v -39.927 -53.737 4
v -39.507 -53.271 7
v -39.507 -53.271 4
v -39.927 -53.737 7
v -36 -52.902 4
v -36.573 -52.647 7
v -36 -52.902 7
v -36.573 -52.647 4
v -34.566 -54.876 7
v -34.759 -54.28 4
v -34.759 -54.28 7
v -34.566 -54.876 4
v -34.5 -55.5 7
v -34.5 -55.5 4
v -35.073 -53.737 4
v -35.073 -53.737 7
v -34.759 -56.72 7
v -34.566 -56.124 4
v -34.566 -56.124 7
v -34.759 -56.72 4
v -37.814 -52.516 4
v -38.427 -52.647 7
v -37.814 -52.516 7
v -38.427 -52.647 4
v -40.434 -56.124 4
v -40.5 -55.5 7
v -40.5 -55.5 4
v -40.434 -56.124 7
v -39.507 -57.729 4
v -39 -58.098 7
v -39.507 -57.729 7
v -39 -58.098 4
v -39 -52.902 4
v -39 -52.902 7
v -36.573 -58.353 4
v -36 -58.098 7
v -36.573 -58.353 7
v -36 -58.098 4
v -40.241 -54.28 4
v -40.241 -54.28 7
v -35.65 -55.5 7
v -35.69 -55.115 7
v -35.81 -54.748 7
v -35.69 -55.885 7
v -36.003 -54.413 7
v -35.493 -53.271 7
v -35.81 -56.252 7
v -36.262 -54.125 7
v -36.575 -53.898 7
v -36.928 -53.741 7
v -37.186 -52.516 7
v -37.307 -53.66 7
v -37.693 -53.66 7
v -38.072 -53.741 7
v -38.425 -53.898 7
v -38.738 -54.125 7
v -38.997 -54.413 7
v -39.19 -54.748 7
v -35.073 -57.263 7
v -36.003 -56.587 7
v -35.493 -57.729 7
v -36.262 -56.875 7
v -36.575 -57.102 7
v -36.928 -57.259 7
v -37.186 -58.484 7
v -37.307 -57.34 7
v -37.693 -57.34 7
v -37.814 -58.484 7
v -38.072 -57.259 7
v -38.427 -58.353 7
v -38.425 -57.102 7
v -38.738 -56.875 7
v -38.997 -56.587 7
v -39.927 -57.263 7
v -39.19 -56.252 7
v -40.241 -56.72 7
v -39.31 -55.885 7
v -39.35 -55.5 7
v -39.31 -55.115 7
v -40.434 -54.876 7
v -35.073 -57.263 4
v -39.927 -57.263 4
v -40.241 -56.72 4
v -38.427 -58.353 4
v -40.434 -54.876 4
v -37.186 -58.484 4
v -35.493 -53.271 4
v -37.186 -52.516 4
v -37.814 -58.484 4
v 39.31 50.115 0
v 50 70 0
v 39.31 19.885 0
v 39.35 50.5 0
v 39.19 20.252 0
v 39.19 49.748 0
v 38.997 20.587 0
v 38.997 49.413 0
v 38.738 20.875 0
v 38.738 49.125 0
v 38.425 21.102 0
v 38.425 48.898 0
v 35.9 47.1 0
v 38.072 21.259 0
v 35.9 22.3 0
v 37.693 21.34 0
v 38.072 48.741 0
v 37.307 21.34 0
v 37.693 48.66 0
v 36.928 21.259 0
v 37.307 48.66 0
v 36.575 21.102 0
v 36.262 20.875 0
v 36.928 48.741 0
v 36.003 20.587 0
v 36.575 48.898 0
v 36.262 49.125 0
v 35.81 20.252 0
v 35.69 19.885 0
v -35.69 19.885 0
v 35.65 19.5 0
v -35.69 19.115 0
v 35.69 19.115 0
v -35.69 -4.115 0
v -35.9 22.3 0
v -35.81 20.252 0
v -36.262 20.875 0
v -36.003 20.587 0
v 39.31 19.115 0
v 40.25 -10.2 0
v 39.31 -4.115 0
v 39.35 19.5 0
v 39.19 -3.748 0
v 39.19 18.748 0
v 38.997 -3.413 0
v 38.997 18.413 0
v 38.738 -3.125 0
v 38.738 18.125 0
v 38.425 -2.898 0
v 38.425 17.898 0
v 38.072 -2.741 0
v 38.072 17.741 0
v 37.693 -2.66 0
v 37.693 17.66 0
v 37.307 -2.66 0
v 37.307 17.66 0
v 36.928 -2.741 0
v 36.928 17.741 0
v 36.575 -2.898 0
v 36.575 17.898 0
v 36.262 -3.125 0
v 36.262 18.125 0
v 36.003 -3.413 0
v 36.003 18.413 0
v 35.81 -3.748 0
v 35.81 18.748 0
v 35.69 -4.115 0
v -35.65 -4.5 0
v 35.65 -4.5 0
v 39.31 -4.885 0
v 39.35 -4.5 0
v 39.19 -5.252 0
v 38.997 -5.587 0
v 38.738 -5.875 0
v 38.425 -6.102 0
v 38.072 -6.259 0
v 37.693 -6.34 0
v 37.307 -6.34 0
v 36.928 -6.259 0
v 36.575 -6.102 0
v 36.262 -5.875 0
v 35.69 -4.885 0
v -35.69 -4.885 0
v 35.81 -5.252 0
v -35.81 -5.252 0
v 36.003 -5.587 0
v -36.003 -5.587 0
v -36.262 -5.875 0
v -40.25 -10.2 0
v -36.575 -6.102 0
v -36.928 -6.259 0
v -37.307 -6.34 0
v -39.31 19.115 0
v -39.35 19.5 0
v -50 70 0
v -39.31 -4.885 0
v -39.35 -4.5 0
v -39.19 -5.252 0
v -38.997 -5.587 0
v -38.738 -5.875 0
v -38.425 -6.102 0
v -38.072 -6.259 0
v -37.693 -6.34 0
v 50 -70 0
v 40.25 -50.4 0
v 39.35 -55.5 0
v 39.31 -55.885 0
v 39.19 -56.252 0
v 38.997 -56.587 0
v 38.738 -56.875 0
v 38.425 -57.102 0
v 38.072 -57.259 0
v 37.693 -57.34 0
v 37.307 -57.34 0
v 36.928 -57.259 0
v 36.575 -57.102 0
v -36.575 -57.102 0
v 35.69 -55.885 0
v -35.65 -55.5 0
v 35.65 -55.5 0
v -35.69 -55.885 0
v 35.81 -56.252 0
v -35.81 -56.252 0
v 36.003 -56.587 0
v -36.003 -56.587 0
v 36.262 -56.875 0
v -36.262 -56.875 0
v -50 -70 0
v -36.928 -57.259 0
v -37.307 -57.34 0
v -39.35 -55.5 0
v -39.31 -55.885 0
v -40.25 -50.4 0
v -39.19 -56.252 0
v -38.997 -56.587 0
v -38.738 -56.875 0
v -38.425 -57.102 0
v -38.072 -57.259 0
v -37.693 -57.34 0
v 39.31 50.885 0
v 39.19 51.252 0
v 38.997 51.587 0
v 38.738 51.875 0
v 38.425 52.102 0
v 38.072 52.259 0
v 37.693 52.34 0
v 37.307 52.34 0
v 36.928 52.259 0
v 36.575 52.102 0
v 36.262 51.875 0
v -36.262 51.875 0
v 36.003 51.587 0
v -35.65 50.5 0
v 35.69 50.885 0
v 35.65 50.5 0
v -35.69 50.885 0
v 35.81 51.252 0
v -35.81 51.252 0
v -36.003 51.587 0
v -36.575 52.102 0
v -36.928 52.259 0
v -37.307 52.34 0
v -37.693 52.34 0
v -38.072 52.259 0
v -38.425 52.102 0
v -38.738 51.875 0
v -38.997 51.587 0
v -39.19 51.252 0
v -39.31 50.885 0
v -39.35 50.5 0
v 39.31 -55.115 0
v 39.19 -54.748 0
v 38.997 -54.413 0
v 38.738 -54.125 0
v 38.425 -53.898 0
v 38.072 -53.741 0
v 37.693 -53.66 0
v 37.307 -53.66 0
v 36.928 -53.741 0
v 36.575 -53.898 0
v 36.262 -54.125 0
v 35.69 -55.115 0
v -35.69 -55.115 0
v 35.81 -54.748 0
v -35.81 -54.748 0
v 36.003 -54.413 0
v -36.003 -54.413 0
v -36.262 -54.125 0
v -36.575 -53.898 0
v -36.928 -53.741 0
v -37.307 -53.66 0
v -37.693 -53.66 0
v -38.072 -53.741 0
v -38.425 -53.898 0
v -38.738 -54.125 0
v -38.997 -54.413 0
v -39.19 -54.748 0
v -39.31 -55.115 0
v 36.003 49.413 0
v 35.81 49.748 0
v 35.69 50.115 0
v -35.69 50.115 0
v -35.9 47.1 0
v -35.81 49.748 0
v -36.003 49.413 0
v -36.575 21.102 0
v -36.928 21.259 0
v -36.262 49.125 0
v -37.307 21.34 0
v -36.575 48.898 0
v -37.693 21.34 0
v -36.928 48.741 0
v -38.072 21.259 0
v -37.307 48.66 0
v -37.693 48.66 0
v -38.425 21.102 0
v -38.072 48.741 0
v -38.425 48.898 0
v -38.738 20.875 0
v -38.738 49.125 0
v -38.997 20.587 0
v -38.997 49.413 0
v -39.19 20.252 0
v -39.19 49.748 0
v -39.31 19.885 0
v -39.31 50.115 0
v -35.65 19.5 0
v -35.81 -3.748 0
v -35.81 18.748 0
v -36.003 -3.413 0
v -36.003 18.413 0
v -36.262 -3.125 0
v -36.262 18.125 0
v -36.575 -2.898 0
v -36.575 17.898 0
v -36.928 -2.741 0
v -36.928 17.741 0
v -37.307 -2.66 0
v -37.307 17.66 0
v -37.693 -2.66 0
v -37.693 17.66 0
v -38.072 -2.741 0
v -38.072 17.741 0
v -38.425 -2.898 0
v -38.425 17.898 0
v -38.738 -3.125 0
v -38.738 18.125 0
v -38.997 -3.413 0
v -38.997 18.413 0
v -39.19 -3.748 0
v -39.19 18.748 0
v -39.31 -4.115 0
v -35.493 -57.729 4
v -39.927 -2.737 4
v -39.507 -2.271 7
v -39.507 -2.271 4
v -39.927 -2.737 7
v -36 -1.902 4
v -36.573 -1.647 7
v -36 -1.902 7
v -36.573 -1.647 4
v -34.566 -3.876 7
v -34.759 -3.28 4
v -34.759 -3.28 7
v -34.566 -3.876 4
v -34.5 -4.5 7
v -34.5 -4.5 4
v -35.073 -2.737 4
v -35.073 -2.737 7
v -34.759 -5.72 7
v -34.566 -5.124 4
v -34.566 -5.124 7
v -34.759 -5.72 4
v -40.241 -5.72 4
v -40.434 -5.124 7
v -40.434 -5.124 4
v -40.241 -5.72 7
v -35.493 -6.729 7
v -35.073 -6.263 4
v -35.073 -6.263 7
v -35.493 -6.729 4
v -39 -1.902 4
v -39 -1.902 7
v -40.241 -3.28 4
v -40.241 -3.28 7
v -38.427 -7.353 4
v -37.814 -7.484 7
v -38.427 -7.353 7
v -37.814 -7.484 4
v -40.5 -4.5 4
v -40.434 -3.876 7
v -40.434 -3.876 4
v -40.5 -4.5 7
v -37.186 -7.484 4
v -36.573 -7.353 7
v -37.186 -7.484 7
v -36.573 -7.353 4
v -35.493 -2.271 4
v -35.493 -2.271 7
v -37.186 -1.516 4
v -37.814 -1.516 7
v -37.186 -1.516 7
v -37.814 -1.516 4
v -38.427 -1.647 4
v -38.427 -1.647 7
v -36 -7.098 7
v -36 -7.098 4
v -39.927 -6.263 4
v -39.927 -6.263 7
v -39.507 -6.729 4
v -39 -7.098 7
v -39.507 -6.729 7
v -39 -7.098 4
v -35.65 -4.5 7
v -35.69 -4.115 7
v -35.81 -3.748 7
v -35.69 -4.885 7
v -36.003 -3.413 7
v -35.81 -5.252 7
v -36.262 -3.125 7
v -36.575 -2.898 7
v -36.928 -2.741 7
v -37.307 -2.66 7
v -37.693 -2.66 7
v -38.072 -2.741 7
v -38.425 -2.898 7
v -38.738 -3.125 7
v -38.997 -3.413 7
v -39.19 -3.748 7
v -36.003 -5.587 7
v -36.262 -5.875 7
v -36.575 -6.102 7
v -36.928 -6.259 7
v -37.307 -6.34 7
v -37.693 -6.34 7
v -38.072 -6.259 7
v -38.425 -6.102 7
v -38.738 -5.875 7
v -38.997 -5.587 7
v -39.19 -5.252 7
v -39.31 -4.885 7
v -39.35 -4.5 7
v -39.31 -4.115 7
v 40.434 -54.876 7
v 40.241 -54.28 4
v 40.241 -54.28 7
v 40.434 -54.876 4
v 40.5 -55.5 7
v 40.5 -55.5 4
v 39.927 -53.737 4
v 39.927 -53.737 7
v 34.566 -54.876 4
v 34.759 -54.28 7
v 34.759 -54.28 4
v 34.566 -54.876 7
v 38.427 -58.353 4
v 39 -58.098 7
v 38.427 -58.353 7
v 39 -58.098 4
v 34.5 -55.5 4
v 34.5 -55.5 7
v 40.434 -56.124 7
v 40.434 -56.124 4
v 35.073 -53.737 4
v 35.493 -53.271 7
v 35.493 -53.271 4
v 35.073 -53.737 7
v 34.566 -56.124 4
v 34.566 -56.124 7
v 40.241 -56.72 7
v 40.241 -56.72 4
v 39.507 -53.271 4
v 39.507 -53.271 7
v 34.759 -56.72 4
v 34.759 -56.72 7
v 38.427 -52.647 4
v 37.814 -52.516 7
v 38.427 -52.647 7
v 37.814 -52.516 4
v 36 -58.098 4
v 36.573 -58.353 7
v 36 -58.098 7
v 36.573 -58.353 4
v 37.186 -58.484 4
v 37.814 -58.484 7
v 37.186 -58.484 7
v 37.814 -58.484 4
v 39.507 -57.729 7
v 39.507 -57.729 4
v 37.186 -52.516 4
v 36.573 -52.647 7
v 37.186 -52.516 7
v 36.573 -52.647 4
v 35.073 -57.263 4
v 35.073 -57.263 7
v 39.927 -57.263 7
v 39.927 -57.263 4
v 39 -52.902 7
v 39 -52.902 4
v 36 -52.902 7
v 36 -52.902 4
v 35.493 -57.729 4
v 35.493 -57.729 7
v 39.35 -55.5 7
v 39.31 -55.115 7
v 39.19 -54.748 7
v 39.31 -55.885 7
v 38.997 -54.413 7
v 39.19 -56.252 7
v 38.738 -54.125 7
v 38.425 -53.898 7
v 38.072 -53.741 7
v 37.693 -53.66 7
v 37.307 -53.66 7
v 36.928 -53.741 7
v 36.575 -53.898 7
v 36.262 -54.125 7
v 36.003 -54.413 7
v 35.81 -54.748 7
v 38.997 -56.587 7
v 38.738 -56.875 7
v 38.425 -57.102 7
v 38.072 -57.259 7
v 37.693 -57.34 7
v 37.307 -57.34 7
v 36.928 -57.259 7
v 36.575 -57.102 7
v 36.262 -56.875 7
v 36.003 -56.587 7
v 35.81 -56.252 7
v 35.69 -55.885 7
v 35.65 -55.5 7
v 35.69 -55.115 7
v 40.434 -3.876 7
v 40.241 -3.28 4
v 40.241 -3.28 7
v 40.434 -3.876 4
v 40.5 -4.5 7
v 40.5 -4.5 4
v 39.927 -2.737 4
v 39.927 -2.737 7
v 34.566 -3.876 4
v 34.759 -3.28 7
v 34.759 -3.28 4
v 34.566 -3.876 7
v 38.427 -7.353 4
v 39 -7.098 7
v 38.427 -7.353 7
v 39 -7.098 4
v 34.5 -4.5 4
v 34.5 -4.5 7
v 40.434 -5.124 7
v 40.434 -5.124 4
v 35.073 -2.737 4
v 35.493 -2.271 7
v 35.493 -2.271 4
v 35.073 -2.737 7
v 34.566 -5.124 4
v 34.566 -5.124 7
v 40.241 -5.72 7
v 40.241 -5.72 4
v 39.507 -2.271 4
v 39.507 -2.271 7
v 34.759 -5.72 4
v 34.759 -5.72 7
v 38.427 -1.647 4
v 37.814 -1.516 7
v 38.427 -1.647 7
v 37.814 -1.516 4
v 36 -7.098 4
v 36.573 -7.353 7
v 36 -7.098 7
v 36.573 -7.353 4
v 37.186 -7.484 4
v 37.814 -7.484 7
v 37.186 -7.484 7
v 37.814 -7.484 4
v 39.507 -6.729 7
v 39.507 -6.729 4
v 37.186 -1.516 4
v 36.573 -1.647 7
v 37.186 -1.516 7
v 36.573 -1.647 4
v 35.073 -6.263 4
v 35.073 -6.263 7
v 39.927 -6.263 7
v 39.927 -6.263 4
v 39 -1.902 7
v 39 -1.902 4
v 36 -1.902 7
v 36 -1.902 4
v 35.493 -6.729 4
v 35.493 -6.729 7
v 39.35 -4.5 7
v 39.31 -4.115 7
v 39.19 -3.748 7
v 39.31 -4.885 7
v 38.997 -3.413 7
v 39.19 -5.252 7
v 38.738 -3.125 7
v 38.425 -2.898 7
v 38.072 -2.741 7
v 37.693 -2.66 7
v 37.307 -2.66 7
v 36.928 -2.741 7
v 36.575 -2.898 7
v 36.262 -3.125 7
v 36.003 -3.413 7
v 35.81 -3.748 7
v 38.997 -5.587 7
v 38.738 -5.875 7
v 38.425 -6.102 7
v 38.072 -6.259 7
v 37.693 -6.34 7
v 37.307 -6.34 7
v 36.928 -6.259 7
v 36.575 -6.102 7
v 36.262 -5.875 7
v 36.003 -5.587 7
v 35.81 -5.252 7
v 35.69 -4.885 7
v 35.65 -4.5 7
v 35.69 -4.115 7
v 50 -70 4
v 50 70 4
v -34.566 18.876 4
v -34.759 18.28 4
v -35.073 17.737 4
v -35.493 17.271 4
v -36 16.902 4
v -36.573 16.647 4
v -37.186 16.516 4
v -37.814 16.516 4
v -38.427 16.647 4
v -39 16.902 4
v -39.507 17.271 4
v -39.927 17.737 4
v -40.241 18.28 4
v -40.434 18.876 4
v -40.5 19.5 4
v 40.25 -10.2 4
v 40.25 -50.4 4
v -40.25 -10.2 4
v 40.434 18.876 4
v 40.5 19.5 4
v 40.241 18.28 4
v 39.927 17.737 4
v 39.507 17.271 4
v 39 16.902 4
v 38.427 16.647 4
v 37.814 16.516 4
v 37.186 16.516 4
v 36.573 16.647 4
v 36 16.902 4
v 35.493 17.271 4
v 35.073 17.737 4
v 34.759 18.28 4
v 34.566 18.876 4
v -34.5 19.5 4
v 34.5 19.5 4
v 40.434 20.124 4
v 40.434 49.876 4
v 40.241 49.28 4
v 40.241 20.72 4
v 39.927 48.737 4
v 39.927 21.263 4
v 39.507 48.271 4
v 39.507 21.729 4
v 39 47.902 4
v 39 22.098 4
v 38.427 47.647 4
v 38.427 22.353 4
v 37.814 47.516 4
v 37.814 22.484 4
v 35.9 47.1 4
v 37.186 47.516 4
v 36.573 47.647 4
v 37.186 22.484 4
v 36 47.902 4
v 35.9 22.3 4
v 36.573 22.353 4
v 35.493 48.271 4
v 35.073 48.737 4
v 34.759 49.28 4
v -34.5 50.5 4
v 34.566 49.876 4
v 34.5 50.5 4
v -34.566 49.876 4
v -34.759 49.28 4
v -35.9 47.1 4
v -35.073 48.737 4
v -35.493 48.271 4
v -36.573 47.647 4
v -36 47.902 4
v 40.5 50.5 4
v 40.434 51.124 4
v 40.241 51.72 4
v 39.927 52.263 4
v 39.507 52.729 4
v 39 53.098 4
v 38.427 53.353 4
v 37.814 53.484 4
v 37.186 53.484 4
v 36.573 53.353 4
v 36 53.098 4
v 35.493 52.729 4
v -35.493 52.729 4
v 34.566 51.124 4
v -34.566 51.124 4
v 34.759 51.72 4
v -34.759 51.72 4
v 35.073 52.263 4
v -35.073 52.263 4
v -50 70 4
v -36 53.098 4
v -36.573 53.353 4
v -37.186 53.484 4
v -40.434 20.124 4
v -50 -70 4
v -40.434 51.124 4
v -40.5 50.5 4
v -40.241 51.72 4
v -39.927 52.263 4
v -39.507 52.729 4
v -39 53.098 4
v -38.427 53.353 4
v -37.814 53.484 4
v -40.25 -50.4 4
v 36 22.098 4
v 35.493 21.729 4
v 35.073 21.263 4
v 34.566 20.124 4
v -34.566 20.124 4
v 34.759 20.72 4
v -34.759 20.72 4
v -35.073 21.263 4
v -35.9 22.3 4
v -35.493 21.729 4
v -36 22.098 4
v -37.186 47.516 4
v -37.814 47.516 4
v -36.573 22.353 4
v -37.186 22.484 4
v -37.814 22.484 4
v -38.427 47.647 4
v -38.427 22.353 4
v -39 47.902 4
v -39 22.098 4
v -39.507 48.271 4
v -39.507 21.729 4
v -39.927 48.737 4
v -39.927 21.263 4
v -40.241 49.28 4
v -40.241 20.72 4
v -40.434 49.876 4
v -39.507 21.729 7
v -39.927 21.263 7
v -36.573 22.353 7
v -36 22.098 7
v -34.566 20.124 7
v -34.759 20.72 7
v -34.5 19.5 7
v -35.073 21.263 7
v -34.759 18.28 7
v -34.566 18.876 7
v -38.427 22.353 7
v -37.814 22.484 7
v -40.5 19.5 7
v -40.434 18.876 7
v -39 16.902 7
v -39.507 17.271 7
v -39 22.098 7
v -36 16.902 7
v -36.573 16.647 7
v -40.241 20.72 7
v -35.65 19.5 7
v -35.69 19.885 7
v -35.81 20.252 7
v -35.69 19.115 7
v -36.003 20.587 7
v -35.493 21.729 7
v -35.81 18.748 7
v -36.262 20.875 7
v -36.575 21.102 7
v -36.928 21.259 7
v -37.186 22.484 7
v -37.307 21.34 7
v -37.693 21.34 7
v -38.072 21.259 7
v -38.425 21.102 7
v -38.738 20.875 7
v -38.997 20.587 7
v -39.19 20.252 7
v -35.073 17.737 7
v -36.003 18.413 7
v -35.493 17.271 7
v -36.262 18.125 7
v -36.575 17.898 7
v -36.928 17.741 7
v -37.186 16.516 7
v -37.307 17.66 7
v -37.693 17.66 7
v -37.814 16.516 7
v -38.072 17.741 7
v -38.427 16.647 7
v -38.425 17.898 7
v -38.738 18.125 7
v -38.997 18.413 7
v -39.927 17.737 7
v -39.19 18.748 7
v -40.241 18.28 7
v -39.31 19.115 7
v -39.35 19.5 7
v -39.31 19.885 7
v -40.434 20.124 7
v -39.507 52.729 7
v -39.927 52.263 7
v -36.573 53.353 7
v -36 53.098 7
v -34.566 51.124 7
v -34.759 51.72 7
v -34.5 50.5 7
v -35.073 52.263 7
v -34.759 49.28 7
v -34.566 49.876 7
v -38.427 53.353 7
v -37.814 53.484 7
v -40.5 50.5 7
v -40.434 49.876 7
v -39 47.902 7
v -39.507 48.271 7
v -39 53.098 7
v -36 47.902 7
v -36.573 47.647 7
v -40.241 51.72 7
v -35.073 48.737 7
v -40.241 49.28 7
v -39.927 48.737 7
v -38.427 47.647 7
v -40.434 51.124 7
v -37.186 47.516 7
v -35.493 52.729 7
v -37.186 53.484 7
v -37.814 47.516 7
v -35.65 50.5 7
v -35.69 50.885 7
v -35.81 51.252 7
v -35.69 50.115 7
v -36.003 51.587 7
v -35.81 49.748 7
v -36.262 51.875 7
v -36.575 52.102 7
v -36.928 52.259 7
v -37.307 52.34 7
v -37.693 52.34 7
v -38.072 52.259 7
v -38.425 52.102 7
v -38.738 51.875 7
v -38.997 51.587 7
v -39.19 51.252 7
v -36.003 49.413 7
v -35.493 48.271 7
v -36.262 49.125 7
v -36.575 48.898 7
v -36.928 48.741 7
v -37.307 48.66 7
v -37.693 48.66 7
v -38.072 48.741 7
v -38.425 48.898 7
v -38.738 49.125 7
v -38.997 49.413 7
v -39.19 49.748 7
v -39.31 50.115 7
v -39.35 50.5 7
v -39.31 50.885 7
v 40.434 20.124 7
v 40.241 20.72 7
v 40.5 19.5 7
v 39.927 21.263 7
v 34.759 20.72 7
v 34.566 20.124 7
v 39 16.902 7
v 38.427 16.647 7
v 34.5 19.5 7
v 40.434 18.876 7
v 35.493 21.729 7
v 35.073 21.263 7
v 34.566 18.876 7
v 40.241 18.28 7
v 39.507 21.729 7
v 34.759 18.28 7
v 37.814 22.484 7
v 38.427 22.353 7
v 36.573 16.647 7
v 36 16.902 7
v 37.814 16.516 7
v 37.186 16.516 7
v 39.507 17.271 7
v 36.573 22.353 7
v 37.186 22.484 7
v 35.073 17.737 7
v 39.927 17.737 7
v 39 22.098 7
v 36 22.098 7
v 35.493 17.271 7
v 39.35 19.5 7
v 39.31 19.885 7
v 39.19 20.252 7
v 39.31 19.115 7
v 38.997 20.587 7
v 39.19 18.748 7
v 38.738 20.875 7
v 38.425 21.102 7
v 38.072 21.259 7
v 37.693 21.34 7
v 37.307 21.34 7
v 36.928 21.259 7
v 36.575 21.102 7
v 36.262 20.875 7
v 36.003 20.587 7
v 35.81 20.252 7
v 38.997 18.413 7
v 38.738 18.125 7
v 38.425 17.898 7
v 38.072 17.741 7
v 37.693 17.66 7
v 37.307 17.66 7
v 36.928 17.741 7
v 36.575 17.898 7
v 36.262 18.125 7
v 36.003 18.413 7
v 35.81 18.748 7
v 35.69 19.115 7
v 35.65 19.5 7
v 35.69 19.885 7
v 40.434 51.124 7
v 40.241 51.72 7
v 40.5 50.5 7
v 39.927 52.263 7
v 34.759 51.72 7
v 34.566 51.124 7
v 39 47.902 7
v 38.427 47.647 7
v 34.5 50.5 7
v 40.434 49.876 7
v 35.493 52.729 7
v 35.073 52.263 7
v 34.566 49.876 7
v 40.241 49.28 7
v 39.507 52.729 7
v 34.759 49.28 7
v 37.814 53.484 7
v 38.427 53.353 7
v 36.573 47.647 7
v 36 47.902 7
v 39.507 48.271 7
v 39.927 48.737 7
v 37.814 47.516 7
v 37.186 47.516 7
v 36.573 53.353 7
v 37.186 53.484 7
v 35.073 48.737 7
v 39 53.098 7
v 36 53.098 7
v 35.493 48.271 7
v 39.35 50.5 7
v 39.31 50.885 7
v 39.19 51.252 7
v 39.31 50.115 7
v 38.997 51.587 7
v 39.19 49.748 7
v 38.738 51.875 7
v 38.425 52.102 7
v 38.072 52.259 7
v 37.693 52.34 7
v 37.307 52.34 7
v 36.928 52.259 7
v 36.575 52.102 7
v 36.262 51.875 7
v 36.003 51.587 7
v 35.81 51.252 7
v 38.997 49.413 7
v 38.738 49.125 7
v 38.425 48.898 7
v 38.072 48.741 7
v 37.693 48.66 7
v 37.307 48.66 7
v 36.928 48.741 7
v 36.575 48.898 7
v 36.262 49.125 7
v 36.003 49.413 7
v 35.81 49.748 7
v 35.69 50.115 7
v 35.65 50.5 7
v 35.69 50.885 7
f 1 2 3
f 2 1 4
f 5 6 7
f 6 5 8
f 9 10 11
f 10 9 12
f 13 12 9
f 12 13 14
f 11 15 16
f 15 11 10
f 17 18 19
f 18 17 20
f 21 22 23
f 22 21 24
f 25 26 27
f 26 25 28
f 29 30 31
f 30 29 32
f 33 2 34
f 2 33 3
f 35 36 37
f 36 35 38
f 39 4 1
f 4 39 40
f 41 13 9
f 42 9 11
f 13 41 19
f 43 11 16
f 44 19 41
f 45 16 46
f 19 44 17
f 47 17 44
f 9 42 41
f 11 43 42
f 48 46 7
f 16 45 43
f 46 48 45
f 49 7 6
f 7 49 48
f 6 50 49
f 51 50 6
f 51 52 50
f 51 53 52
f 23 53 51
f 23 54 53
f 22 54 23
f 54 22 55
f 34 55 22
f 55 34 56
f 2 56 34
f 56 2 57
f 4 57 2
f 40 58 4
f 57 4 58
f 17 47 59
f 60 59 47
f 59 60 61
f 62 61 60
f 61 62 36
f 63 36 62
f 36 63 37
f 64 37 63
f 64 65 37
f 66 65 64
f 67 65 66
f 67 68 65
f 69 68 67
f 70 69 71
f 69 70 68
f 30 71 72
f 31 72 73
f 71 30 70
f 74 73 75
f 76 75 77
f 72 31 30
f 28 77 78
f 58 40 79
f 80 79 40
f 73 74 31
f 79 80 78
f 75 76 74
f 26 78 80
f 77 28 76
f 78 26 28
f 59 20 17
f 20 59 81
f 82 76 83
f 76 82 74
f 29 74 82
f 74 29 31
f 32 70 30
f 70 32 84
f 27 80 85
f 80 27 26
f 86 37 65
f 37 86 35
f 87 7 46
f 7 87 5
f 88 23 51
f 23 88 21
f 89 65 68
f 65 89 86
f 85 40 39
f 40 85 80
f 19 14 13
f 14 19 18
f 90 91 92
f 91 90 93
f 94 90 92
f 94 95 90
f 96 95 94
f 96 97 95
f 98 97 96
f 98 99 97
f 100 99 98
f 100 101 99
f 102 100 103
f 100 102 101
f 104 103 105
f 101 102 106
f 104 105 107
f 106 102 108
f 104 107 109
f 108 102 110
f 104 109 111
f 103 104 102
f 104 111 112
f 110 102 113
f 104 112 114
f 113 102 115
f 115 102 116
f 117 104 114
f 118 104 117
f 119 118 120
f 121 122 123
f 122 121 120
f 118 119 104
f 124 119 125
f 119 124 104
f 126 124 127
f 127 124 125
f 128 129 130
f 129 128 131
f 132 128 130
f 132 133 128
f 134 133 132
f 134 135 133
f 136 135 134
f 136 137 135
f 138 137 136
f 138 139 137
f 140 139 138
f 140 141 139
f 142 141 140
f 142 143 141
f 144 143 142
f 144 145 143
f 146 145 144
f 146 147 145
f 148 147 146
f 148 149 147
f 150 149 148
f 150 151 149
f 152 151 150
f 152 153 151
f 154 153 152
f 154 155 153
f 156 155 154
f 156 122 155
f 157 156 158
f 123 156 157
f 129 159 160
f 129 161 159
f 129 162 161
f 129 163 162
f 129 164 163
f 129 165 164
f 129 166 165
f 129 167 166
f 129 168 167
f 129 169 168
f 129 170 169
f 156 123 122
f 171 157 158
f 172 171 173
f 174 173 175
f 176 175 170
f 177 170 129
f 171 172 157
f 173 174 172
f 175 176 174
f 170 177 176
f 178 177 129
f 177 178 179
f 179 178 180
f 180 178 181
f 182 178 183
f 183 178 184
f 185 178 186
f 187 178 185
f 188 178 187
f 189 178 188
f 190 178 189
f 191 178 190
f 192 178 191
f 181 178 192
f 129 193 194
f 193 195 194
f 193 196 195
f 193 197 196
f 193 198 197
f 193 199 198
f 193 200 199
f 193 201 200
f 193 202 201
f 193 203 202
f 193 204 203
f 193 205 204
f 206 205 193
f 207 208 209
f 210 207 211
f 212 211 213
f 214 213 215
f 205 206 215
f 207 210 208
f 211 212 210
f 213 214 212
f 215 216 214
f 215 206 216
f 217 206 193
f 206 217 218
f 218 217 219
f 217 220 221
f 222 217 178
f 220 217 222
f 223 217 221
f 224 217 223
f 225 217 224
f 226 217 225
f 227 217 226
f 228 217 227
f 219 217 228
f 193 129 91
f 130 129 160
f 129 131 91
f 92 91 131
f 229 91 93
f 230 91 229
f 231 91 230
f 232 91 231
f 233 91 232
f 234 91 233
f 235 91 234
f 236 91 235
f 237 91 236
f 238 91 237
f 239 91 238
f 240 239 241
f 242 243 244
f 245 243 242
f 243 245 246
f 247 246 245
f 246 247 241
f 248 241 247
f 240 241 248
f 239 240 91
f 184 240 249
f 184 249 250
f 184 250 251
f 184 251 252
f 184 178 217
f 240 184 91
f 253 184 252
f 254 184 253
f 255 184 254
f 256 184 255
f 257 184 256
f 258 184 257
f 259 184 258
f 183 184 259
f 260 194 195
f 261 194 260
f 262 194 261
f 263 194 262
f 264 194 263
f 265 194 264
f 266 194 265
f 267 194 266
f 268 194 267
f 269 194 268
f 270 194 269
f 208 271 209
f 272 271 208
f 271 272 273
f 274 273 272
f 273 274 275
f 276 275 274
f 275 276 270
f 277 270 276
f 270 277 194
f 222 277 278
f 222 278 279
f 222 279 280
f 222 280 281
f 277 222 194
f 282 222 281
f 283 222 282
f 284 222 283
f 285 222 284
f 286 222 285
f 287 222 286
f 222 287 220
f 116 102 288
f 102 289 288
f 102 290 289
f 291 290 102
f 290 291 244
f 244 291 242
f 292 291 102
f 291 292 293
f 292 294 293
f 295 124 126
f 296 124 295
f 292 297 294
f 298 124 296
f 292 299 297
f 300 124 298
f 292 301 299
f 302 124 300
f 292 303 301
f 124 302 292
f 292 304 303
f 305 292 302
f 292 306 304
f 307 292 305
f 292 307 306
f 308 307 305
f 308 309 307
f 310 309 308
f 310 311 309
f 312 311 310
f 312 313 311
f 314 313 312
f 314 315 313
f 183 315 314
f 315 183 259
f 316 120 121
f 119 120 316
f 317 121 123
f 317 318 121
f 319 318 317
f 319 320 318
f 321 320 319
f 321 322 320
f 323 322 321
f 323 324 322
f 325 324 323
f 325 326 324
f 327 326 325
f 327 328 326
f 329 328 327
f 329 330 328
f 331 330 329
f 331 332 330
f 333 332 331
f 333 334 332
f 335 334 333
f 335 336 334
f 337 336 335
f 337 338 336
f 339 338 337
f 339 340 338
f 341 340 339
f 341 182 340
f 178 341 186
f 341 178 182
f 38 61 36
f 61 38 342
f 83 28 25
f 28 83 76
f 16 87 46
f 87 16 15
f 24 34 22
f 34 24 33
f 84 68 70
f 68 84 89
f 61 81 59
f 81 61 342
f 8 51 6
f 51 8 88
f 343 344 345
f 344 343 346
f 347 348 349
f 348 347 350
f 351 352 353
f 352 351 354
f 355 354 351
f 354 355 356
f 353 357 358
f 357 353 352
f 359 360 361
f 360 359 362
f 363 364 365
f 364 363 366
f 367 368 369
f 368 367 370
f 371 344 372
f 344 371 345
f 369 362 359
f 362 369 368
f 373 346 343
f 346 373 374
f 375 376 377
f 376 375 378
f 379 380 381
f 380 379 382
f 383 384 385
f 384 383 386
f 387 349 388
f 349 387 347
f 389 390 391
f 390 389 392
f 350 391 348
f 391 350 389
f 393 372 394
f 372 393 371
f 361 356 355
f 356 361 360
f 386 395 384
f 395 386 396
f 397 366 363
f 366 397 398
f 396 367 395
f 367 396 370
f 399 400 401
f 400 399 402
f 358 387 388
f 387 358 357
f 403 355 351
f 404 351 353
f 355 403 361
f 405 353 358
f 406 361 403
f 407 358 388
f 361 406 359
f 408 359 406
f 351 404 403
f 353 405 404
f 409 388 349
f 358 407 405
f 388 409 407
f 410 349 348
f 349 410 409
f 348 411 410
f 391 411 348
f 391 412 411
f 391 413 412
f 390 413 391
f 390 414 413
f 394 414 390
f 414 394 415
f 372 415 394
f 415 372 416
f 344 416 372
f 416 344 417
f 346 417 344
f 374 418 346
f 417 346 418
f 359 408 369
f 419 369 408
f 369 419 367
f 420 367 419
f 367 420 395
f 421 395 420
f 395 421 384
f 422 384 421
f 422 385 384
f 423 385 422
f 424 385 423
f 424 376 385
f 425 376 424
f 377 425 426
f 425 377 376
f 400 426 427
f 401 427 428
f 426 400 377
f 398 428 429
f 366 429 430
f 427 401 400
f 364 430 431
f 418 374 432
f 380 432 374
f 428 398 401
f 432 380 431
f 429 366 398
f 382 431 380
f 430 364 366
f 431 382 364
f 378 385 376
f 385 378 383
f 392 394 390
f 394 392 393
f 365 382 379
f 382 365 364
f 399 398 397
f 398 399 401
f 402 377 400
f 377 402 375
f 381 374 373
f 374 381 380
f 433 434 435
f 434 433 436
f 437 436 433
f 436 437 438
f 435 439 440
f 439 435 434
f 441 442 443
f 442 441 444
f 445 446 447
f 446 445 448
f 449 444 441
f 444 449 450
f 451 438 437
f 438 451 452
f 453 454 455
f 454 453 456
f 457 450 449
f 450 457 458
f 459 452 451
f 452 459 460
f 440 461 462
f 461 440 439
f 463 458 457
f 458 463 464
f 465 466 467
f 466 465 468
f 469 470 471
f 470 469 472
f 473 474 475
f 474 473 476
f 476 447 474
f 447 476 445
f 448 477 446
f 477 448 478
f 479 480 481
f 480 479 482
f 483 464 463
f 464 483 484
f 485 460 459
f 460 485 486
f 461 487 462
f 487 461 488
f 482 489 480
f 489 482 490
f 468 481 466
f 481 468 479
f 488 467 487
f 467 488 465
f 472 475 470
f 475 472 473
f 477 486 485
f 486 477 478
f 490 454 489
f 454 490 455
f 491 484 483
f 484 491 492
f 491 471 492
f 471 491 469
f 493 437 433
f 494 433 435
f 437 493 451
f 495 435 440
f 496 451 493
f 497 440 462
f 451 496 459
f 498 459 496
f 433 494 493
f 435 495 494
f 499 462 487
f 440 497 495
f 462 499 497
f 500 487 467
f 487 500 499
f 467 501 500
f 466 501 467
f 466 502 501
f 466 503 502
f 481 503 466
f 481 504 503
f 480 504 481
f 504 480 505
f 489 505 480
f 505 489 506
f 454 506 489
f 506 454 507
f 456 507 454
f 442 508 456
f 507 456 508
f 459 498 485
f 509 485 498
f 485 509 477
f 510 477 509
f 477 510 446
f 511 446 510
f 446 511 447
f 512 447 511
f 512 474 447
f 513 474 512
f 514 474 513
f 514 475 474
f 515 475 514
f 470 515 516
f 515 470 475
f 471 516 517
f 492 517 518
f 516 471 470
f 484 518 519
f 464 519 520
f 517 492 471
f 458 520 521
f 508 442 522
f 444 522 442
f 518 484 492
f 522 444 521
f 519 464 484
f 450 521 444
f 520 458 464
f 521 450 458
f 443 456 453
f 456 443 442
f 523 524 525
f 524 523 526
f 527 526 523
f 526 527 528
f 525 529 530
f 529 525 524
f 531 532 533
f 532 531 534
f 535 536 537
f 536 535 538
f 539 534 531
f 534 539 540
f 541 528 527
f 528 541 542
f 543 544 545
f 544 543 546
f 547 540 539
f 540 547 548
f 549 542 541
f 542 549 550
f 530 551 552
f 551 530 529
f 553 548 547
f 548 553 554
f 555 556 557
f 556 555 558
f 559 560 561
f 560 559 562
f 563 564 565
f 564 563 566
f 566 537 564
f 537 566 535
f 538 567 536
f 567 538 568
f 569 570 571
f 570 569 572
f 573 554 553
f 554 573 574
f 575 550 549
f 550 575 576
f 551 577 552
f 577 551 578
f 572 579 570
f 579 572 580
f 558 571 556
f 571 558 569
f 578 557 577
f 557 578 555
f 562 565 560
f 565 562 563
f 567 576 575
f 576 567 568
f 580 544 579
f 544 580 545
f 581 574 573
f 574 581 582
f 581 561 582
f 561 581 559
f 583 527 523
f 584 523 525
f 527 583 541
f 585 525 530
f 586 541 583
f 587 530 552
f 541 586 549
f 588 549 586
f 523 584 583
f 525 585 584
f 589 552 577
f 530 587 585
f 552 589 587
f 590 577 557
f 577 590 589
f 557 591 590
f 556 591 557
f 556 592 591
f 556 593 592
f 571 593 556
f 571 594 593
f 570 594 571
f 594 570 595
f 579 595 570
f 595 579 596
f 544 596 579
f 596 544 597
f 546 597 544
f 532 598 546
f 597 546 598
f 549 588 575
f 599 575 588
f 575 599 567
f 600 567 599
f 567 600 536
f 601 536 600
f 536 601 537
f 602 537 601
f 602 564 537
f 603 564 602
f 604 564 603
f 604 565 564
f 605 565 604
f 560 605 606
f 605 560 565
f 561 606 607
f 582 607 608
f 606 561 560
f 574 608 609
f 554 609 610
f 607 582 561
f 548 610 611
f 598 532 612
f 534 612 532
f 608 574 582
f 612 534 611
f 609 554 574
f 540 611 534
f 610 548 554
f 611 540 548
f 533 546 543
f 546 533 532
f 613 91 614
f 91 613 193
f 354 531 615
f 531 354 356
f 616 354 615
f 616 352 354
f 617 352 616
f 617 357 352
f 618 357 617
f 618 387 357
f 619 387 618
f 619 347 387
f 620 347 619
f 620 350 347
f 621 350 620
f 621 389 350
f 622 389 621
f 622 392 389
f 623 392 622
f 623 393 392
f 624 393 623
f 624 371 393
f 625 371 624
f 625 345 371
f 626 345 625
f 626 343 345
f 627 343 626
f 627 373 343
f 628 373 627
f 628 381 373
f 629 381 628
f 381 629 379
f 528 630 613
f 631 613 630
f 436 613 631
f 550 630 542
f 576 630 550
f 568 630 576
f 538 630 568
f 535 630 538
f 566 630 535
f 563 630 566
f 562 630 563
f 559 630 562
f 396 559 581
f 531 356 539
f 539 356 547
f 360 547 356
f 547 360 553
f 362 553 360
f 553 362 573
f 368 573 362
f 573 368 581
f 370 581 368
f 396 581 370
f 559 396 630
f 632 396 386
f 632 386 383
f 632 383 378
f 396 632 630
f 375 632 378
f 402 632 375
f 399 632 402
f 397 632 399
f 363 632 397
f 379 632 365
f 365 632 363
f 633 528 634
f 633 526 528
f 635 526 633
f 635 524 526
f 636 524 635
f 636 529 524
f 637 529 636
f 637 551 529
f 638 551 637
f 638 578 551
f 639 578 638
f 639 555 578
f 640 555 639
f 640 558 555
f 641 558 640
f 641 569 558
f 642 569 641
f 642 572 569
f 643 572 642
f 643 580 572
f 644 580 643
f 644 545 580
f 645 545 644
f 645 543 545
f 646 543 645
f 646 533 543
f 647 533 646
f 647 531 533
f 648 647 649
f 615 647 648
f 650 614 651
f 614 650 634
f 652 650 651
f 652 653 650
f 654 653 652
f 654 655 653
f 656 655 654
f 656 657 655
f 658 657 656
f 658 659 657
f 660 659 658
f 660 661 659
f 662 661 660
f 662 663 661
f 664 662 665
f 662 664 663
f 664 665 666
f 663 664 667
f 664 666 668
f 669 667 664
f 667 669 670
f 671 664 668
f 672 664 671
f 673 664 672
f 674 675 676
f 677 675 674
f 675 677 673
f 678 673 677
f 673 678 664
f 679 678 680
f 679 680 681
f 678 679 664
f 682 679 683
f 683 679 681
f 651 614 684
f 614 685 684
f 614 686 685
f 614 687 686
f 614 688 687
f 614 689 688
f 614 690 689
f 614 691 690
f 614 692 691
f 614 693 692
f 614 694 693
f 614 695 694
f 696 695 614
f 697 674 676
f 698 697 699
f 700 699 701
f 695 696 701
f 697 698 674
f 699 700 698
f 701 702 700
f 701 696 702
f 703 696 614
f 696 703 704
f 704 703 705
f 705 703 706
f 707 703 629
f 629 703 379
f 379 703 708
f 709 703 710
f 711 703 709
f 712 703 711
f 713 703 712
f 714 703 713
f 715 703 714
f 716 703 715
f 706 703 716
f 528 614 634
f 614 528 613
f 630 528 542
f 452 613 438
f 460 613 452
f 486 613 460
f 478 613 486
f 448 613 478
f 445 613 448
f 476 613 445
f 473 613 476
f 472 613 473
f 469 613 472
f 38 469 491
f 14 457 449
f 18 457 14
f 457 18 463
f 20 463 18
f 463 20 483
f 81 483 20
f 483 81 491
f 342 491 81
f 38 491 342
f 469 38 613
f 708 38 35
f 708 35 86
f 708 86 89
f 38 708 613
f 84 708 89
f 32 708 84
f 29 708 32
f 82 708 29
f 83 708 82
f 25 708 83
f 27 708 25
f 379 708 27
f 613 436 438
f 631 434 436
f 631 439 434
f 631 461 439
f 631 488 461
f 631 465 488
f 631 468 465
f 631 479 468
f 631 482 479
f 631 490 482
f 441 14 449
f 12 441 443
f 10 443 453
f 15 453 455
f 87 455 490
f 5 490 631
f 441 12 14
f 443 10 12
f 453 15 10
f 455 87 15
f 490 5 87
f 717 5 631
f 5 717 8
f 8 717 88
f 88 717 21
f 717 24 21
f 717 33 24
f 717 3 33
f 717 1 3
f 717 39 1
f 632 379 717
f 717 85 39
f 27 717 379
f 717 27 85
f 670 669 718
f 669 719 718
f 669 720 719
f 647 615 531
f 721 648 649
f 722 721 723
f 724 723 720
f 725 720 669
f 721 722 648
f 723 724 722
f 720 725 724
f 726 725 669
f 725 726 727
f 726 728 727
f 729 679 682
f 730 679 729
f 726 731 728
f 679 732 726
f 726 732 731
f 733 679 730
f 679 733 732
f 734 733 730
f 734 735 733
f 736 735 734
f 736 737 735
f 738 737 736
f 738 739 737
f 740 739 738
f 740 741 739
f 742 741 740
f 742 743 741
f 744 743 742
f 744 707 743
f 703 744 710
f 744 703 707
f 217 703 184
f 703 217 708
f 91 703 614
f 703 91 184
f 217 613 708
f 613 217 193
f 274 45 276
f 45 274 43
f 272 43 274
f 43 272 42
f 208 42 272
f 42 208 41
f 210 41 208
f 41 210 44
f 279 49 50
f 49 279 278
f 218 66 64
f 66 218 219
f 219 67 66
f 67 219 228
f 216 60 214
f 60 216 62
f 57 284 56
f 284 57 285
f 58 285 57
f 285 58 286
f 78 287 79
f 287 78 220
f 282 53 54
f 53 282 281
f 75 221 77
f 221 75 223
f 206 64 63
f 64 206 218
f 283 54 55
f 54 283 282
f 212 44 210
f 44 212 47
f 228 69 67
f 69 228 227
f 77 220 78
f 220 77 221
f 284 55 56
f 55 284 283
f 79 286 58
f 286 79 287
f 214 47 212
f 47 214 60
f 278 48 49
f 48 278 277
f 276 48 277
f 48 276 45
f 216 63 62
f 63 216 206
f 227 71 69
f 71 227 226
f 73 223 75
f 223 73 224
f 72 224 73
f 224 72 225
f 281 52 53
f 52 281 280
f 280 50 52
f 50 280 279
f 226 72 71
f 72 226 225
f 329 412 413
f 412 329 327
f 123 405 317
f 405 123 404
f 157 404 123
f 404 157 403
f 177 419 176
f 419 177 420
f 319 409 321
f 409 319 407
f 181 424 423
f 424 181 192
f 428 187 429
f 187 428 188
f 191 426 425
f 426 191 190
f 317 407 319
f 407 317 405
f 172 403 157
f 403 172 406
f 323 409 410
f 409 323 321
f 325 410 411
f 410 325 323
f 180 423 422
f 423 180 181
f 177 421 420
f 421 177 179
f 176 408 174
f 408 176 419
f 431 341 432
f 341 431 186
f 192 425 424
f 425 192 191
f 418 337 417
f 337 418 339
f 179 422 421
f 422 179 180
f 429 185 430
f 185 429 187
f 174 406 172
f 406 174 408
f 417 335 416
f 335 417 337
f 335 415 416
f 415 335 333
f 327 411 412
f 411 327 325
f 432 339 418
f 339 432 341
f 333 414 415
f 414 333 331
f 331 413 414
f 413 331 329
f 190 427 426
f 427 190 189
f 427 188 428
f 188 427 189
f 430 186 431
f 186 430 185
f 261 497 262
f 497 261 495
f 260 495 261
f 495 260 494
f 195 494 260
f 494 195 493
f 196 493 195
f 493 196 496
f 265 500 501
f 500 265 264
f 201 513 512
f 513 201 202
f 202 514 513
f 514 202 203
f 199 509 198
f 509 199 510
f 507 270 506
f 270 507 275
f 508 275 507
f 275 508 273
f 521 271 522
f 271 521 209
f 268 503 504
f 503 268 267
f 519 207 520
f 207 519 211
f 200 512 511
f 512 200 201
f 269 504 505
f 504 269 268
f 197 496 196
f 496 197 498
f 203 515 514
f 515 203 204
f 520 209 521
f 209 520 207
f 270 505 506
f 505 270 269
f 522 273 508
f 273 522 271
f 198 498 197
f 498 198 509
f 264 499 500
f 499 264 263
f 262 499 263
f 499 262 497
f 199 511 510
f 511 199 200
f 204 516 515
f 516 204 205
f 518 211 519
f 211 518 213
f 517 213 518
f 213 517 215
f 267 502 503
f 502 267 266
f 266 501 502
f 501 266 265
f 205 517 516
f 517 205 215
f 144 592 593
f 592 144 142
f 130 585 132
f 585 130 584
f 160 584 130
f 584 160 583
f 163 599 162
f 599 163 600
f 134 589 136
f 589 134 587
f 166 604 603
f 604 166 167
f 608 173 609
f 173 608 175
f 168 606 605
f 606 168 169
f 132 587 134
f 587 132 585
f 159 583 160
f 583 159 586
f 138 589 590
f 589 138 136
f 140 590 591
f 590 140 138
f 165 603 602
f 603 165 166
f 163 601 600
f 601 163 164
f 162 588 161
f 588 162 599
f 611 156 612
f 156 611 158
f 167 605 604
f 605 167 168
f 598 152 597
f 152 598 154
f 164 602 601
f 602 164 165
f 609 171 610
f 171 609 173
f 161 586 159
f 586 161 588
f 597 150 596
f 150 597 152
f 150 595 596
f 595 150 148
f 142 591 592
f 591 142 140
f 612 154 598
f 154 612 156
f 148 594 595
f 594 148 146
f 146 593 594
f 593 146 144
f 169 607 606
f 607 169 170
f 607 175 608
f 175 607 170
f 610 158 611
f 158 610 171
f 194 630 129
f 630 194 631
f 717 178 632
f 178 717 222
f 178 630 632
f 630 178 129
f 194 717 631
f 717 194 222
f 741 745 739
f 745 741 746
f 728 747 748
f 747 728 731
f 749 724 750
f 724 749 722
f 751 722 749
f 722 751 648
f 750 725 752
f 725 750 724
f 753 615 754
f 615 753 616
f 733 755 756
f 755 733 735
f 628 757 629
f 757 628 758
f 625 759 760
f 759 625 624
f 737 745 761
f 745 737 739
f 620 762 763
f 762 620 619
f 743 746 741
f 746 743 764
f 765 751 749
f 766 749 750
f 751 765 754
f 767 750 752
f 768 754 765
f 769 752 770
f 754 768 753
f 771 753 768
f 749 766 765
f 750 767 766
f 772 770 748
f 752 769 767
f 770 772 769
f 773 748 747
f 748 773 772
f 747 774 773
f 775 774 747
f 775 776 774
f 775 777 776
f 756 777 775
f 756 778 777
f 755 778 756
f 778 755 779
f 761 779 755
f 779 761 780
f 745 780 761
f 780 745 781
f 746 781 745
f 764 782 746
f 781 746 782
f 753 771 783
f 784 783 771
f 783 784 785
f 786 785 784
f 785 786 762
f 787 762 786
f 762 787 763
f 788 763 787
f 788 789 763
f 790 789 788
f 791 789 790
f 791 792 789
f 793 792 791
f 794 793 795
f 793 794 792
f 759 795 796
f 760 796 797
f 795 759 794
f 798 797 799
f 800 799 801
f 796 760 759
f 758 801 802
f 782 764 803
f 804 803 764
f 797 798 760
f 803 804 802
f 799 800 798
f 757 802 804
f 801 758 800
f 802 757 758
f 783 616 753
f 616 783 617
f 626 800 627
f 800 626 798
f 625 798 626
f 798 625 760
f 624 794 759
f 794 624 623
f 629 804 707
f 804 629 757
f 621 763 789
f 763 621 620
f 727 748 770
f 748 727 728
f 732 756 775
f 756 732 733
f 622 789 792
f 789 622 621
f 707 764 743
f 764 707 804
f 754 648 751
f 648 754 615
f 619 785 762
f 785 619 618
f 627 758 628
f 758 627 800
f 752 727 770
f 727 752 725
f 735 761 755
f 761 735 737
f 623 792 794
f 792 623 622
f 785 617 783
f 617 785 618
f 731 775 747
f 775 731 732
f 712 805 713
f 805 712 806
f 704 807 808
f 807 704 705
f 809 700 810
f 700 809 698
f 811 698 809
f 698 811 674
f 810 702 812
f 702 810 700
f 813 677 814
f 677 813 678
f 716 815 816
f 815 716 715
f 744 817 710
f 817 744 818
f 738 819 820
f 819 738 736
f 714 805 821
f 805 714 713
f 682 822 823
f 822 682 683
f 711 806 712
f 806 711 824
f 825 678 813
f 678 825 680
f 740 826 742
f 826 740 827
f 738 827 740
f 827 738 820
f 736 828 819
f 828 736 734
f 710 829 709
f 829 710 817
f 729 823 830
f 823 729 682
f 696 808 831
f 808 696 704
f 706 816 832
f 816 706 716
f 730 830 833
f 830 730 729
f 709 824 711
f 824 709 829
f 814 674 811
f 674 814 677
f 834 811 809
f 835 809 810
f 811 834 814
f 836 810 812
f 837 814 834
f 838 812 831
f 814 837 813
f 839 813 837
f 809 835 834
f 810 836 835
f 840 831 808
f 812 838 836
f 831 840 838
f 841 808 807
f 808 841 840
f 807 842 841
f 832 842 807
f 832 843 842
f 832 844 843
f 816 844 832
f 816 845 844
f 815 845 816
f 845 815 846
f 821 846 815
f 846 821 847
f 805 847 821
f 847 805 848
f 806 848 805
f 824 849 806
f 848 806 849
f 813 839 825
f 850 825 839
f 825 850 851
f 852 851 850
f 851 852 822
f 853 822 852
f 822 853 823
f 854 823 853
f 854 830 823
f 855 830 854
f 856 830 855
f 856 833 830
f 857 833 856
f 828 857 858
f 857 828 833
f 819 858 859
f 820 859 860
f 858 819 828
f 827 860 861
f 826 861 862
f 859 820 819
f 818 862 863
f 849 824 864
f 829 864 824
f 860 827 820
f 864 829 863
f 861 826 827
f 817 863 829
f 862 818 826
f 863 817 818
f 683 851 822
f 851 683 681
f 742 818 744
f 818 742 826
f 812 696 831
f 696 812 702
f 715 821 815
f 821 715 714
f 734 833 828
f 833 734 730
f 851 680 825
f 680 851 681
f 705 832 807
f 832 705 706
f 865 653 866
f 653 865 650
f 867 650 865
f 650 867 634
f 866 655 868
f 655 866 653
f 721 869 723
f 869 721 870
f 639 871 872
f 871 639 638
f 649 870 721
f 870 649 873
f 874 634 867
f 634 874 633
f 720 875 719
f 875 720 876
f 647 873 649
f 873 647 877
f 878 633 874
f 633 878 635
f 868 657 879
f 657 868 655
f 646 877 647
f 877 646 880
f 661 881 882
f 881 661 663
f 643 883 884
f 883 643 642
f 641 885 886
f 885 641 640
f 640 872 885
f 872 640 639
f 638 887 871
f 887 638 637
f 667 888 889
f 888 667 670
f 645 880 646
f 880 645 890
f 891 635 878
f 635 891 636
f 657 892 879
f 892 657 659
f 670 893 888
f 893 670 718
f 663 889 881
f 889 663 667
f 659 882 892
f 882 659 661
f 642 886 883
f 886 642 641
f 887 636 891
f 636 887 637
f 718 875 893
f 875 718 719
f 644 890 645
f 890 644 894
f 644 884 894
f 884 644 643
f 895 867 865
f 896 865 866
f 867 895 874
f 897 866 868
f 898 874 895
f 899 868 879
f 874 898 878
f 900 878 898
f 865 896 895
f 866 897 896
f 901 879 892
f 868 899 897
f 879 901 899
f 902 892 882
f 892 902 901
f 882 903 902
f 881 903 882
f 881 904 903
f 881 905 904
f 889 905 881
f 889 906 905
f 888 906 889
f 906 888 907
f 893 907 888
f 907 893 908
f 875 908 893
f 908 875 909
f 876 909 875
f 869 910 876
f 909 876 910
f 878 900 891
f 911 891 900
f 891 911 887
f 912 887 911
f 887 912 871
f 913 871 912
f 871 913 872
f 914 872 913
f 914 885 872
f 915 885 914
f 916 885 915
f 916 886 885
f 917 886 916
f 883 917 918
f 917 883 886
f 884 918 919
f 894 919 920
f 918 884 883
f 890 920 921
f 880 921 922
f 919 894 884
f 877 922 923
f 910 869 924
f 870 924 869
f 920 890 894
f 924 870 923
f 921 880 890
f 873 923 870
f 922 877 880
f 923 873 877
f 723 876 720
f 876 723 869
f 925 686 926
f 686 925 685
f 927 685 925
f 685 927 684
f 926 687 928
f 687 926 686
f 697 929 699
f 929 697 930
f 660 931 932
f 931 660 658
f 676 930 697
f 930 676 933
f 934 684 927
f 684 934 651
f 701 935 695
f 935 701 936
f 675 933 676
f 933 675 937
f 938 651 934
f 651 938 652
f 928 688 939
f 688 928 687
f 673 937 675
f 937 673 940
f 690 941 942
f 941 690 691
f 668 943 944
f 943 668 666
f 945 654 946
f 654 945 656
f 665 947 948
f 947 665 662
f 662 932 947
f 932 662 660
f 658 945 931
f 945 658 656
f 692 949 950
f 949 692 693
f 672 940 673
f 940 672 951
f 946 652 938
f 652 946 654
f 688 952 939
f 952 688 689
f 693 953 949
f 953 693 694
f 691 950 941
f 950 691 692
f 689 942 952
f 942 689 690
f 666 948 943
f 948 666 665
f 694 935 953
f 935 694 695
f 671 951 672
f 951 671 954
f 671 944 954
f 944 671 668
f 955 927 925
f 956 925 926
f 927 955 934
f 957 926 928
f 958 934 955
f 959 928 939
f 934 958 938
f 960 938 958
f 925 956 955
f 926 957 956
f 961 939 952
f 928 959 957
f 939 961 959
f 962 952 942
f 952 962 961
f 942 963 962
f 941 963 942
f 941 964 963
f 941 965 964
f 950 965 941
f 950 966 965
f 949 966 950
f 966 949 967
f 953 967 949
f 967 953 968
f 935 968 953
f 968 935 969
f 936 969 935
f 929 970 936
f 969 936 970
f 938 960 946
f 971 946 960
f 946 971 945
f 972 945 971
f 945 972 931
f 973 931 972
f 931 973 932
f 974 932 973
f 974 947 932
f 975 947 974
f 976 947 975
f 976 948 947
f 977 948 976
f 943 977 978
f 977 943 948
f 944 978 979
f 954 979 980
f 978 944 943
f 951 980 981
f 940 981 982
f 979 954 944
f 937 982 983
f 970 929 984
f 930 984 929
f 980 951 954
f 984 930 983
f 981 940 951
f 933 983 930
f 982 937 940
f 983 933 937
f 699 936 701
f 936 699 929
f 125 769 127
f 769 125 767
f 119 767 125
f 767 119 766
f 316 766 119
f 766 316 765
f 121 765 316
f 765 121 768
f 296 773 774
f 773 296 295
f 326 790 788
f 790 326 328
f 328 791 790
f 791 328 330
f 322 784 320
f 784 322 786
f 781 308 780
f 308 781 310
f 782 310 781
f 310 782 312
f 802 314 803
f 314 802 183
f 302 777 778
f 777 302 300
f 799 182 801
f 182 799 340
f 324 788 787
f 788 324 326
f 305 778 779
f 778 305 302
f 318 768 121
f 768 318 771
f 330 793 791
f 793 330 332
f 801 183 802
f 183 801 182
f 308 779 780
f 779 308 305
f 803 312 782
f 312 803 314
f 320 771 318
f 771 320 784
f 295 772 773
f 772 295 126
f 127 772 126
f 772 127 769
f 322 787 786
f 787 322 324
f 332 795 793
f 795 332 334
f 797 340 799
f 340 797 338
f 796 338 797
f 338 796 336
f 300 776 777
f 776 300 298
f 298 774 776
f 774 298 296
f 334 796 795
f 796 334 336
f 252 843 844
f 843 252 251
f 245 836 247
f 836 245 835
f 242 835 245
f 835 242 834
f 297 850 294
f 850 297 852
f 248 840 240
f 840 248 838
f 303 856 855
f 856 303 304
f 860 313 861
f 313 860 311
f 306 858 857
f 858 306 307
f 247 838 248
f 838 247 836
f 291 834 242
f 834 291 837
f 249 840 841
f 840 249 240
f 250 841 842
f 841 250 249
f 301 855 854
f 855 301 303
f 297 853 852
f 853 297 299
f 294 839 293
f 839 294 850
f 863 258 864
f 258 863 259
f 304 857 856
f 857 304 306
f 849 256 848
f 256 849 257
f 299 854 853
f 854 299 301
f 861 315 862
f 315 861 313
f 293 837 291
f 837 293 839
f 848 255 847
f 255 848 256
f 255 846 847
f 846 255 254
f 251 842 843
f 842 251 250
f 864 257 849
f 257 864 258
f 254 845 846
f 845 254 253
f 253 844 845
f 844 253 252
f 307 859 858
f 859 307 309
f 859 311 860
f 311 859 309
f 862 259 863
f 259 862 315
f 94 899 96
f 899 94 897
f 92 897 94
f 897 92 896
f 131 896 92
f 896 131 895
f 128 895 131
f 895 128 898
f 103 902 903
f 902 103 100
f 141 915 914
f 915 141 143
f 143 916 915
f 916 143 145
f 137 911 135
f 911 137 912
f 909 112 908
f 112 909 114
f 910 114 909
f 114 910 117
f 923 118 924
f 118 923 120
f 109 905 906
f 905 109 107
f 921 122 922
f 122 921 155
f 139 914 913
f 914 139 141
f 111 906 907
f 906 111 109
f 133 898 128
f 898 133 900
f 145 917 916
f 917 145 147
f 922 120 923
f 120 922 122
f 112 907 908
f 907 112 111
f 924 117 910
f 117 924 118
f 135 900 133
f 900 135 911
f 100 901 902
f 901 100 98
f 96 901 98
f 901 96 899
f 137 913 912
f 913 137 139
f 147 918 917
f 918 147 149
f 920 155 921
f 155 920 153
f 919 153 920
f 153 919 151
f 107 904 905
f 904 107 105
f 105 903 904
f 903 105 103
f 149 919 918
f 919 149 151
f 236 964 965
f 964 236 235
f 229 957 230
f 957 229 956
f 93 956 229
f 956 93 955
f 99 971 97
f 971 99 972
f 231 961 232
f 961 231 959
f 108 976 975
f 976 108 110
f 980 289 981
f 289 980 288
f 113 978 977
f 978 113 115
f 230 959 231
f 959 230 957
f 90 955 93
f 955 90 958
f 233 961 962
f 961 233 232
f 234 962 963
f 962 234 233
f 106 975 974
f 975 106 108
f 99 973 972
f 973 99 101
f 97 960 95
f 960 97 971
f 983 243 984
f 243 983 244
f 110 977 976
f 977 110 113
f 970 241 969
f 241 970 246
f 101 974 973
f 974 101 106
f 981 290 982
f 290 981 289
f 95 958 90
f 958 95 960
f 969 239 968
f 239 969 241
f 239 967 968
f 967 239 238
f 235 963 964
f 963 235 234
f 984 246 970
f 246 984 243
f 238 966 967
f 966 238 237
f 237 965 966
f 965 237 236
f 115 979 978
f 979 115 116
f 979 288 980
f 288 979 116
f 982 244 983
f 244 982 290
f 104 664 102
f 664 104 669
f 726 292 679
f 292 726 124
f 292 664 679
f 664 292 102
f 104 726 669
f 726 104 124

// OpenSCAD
// x/y but not z centered cube (regular center=true also centered z)
module xy_center_cube (size) {
  translate([-size[0]/2, -size[1]/2, 0])
  cube(size, center=false);
}

// lcd cutout and screw holes (made on the first child in the stack)
// @param type which type of LCD, see types below for supported types
// @param location where the lcd should be centered
module LCD(type = "16x2", location = [0,0,0]) {

  // check if there are children (needs at least one to place LCD)
  if ($children == 0) {
    echo("WARNING - need at least one child to build LCD into");
  }

  // parameters
  xy_plus = 0.1; // how much thicker to make cutouts in xy

  // different types of supported LCDs
  types = [
    // name; lcd w, h; lcd thickness (-pcb); lcd center offset (relative to screws); screws x, y, d; screw socket diamter
    ["16x2", [71.8, 24.8, 7], [0, -0.3, 0], [37.5, 15.5, 3.7], 6],
    ["20x4", [80.5, 40.2, 7], [0, -0.3, 0], [37.5, 25.5, 3.7], 6] // FIXME exact
  ];
  type_idx = search([type], types)[0];

  if (len(type_idx) == 0) {
    echo(str("cannot render LCD - unrecognized type '", type , "'"));
  } else {
    echo(str("rendering LCD type '", type , "'"));

    // information text (not visible in rendered version - % modifier)
    %translate(location)
    {
      translate([0, 1, 0])
      text("this way up", size = 5, valign = "bottom",
        halign = "center");
      translate([0, -1, 0])
      text(str(type, " LCD"), size = 5, valign = "top",
        halign = "center");
    }

    // parameters
    lcd_size = types[type_idx][1];
    lcd_offset = types[type_idx][2];
    screws = types[type_idx][3];
    screw_socket_d = types[type_idx][4];

    difference() {
      union() {
        children(0);
        translate(location) {
          // screw sockets
          for(x=[-1, 1])
            for(y=[-1, 1])
              translate([x*screws[0], y*screws[1], 0])
                cylinder(h=lcd_size[2], d=screw_socket_d, center = false, $fn=30);
        }
      }
      translate(location) {
        // screw holes
        for(x=[-1, 1])
          for(y=[-1, 1])
            translate([x*screws[0], y*screws[1], -xy_plus])
              cylinder(h=lcd_size[2] + 2*xy_plus, d=screws[2], center = false, $fn=30);
        // lcd cutout
        translate(lcd_offset)
          translate([0, 0, -xy_plus])
          resize([0, 0, lcd_size[2] + 2*xy_plus])
          xy_center_cube(lcd_size);
      }
    }
  }
}



// example
color("red")
LCD(type = "16x2", location = [0, 35, 0])
LCD(type = "20x4", location = [0, -30, 0])
xy_center_cube([100, 140, 4]);
